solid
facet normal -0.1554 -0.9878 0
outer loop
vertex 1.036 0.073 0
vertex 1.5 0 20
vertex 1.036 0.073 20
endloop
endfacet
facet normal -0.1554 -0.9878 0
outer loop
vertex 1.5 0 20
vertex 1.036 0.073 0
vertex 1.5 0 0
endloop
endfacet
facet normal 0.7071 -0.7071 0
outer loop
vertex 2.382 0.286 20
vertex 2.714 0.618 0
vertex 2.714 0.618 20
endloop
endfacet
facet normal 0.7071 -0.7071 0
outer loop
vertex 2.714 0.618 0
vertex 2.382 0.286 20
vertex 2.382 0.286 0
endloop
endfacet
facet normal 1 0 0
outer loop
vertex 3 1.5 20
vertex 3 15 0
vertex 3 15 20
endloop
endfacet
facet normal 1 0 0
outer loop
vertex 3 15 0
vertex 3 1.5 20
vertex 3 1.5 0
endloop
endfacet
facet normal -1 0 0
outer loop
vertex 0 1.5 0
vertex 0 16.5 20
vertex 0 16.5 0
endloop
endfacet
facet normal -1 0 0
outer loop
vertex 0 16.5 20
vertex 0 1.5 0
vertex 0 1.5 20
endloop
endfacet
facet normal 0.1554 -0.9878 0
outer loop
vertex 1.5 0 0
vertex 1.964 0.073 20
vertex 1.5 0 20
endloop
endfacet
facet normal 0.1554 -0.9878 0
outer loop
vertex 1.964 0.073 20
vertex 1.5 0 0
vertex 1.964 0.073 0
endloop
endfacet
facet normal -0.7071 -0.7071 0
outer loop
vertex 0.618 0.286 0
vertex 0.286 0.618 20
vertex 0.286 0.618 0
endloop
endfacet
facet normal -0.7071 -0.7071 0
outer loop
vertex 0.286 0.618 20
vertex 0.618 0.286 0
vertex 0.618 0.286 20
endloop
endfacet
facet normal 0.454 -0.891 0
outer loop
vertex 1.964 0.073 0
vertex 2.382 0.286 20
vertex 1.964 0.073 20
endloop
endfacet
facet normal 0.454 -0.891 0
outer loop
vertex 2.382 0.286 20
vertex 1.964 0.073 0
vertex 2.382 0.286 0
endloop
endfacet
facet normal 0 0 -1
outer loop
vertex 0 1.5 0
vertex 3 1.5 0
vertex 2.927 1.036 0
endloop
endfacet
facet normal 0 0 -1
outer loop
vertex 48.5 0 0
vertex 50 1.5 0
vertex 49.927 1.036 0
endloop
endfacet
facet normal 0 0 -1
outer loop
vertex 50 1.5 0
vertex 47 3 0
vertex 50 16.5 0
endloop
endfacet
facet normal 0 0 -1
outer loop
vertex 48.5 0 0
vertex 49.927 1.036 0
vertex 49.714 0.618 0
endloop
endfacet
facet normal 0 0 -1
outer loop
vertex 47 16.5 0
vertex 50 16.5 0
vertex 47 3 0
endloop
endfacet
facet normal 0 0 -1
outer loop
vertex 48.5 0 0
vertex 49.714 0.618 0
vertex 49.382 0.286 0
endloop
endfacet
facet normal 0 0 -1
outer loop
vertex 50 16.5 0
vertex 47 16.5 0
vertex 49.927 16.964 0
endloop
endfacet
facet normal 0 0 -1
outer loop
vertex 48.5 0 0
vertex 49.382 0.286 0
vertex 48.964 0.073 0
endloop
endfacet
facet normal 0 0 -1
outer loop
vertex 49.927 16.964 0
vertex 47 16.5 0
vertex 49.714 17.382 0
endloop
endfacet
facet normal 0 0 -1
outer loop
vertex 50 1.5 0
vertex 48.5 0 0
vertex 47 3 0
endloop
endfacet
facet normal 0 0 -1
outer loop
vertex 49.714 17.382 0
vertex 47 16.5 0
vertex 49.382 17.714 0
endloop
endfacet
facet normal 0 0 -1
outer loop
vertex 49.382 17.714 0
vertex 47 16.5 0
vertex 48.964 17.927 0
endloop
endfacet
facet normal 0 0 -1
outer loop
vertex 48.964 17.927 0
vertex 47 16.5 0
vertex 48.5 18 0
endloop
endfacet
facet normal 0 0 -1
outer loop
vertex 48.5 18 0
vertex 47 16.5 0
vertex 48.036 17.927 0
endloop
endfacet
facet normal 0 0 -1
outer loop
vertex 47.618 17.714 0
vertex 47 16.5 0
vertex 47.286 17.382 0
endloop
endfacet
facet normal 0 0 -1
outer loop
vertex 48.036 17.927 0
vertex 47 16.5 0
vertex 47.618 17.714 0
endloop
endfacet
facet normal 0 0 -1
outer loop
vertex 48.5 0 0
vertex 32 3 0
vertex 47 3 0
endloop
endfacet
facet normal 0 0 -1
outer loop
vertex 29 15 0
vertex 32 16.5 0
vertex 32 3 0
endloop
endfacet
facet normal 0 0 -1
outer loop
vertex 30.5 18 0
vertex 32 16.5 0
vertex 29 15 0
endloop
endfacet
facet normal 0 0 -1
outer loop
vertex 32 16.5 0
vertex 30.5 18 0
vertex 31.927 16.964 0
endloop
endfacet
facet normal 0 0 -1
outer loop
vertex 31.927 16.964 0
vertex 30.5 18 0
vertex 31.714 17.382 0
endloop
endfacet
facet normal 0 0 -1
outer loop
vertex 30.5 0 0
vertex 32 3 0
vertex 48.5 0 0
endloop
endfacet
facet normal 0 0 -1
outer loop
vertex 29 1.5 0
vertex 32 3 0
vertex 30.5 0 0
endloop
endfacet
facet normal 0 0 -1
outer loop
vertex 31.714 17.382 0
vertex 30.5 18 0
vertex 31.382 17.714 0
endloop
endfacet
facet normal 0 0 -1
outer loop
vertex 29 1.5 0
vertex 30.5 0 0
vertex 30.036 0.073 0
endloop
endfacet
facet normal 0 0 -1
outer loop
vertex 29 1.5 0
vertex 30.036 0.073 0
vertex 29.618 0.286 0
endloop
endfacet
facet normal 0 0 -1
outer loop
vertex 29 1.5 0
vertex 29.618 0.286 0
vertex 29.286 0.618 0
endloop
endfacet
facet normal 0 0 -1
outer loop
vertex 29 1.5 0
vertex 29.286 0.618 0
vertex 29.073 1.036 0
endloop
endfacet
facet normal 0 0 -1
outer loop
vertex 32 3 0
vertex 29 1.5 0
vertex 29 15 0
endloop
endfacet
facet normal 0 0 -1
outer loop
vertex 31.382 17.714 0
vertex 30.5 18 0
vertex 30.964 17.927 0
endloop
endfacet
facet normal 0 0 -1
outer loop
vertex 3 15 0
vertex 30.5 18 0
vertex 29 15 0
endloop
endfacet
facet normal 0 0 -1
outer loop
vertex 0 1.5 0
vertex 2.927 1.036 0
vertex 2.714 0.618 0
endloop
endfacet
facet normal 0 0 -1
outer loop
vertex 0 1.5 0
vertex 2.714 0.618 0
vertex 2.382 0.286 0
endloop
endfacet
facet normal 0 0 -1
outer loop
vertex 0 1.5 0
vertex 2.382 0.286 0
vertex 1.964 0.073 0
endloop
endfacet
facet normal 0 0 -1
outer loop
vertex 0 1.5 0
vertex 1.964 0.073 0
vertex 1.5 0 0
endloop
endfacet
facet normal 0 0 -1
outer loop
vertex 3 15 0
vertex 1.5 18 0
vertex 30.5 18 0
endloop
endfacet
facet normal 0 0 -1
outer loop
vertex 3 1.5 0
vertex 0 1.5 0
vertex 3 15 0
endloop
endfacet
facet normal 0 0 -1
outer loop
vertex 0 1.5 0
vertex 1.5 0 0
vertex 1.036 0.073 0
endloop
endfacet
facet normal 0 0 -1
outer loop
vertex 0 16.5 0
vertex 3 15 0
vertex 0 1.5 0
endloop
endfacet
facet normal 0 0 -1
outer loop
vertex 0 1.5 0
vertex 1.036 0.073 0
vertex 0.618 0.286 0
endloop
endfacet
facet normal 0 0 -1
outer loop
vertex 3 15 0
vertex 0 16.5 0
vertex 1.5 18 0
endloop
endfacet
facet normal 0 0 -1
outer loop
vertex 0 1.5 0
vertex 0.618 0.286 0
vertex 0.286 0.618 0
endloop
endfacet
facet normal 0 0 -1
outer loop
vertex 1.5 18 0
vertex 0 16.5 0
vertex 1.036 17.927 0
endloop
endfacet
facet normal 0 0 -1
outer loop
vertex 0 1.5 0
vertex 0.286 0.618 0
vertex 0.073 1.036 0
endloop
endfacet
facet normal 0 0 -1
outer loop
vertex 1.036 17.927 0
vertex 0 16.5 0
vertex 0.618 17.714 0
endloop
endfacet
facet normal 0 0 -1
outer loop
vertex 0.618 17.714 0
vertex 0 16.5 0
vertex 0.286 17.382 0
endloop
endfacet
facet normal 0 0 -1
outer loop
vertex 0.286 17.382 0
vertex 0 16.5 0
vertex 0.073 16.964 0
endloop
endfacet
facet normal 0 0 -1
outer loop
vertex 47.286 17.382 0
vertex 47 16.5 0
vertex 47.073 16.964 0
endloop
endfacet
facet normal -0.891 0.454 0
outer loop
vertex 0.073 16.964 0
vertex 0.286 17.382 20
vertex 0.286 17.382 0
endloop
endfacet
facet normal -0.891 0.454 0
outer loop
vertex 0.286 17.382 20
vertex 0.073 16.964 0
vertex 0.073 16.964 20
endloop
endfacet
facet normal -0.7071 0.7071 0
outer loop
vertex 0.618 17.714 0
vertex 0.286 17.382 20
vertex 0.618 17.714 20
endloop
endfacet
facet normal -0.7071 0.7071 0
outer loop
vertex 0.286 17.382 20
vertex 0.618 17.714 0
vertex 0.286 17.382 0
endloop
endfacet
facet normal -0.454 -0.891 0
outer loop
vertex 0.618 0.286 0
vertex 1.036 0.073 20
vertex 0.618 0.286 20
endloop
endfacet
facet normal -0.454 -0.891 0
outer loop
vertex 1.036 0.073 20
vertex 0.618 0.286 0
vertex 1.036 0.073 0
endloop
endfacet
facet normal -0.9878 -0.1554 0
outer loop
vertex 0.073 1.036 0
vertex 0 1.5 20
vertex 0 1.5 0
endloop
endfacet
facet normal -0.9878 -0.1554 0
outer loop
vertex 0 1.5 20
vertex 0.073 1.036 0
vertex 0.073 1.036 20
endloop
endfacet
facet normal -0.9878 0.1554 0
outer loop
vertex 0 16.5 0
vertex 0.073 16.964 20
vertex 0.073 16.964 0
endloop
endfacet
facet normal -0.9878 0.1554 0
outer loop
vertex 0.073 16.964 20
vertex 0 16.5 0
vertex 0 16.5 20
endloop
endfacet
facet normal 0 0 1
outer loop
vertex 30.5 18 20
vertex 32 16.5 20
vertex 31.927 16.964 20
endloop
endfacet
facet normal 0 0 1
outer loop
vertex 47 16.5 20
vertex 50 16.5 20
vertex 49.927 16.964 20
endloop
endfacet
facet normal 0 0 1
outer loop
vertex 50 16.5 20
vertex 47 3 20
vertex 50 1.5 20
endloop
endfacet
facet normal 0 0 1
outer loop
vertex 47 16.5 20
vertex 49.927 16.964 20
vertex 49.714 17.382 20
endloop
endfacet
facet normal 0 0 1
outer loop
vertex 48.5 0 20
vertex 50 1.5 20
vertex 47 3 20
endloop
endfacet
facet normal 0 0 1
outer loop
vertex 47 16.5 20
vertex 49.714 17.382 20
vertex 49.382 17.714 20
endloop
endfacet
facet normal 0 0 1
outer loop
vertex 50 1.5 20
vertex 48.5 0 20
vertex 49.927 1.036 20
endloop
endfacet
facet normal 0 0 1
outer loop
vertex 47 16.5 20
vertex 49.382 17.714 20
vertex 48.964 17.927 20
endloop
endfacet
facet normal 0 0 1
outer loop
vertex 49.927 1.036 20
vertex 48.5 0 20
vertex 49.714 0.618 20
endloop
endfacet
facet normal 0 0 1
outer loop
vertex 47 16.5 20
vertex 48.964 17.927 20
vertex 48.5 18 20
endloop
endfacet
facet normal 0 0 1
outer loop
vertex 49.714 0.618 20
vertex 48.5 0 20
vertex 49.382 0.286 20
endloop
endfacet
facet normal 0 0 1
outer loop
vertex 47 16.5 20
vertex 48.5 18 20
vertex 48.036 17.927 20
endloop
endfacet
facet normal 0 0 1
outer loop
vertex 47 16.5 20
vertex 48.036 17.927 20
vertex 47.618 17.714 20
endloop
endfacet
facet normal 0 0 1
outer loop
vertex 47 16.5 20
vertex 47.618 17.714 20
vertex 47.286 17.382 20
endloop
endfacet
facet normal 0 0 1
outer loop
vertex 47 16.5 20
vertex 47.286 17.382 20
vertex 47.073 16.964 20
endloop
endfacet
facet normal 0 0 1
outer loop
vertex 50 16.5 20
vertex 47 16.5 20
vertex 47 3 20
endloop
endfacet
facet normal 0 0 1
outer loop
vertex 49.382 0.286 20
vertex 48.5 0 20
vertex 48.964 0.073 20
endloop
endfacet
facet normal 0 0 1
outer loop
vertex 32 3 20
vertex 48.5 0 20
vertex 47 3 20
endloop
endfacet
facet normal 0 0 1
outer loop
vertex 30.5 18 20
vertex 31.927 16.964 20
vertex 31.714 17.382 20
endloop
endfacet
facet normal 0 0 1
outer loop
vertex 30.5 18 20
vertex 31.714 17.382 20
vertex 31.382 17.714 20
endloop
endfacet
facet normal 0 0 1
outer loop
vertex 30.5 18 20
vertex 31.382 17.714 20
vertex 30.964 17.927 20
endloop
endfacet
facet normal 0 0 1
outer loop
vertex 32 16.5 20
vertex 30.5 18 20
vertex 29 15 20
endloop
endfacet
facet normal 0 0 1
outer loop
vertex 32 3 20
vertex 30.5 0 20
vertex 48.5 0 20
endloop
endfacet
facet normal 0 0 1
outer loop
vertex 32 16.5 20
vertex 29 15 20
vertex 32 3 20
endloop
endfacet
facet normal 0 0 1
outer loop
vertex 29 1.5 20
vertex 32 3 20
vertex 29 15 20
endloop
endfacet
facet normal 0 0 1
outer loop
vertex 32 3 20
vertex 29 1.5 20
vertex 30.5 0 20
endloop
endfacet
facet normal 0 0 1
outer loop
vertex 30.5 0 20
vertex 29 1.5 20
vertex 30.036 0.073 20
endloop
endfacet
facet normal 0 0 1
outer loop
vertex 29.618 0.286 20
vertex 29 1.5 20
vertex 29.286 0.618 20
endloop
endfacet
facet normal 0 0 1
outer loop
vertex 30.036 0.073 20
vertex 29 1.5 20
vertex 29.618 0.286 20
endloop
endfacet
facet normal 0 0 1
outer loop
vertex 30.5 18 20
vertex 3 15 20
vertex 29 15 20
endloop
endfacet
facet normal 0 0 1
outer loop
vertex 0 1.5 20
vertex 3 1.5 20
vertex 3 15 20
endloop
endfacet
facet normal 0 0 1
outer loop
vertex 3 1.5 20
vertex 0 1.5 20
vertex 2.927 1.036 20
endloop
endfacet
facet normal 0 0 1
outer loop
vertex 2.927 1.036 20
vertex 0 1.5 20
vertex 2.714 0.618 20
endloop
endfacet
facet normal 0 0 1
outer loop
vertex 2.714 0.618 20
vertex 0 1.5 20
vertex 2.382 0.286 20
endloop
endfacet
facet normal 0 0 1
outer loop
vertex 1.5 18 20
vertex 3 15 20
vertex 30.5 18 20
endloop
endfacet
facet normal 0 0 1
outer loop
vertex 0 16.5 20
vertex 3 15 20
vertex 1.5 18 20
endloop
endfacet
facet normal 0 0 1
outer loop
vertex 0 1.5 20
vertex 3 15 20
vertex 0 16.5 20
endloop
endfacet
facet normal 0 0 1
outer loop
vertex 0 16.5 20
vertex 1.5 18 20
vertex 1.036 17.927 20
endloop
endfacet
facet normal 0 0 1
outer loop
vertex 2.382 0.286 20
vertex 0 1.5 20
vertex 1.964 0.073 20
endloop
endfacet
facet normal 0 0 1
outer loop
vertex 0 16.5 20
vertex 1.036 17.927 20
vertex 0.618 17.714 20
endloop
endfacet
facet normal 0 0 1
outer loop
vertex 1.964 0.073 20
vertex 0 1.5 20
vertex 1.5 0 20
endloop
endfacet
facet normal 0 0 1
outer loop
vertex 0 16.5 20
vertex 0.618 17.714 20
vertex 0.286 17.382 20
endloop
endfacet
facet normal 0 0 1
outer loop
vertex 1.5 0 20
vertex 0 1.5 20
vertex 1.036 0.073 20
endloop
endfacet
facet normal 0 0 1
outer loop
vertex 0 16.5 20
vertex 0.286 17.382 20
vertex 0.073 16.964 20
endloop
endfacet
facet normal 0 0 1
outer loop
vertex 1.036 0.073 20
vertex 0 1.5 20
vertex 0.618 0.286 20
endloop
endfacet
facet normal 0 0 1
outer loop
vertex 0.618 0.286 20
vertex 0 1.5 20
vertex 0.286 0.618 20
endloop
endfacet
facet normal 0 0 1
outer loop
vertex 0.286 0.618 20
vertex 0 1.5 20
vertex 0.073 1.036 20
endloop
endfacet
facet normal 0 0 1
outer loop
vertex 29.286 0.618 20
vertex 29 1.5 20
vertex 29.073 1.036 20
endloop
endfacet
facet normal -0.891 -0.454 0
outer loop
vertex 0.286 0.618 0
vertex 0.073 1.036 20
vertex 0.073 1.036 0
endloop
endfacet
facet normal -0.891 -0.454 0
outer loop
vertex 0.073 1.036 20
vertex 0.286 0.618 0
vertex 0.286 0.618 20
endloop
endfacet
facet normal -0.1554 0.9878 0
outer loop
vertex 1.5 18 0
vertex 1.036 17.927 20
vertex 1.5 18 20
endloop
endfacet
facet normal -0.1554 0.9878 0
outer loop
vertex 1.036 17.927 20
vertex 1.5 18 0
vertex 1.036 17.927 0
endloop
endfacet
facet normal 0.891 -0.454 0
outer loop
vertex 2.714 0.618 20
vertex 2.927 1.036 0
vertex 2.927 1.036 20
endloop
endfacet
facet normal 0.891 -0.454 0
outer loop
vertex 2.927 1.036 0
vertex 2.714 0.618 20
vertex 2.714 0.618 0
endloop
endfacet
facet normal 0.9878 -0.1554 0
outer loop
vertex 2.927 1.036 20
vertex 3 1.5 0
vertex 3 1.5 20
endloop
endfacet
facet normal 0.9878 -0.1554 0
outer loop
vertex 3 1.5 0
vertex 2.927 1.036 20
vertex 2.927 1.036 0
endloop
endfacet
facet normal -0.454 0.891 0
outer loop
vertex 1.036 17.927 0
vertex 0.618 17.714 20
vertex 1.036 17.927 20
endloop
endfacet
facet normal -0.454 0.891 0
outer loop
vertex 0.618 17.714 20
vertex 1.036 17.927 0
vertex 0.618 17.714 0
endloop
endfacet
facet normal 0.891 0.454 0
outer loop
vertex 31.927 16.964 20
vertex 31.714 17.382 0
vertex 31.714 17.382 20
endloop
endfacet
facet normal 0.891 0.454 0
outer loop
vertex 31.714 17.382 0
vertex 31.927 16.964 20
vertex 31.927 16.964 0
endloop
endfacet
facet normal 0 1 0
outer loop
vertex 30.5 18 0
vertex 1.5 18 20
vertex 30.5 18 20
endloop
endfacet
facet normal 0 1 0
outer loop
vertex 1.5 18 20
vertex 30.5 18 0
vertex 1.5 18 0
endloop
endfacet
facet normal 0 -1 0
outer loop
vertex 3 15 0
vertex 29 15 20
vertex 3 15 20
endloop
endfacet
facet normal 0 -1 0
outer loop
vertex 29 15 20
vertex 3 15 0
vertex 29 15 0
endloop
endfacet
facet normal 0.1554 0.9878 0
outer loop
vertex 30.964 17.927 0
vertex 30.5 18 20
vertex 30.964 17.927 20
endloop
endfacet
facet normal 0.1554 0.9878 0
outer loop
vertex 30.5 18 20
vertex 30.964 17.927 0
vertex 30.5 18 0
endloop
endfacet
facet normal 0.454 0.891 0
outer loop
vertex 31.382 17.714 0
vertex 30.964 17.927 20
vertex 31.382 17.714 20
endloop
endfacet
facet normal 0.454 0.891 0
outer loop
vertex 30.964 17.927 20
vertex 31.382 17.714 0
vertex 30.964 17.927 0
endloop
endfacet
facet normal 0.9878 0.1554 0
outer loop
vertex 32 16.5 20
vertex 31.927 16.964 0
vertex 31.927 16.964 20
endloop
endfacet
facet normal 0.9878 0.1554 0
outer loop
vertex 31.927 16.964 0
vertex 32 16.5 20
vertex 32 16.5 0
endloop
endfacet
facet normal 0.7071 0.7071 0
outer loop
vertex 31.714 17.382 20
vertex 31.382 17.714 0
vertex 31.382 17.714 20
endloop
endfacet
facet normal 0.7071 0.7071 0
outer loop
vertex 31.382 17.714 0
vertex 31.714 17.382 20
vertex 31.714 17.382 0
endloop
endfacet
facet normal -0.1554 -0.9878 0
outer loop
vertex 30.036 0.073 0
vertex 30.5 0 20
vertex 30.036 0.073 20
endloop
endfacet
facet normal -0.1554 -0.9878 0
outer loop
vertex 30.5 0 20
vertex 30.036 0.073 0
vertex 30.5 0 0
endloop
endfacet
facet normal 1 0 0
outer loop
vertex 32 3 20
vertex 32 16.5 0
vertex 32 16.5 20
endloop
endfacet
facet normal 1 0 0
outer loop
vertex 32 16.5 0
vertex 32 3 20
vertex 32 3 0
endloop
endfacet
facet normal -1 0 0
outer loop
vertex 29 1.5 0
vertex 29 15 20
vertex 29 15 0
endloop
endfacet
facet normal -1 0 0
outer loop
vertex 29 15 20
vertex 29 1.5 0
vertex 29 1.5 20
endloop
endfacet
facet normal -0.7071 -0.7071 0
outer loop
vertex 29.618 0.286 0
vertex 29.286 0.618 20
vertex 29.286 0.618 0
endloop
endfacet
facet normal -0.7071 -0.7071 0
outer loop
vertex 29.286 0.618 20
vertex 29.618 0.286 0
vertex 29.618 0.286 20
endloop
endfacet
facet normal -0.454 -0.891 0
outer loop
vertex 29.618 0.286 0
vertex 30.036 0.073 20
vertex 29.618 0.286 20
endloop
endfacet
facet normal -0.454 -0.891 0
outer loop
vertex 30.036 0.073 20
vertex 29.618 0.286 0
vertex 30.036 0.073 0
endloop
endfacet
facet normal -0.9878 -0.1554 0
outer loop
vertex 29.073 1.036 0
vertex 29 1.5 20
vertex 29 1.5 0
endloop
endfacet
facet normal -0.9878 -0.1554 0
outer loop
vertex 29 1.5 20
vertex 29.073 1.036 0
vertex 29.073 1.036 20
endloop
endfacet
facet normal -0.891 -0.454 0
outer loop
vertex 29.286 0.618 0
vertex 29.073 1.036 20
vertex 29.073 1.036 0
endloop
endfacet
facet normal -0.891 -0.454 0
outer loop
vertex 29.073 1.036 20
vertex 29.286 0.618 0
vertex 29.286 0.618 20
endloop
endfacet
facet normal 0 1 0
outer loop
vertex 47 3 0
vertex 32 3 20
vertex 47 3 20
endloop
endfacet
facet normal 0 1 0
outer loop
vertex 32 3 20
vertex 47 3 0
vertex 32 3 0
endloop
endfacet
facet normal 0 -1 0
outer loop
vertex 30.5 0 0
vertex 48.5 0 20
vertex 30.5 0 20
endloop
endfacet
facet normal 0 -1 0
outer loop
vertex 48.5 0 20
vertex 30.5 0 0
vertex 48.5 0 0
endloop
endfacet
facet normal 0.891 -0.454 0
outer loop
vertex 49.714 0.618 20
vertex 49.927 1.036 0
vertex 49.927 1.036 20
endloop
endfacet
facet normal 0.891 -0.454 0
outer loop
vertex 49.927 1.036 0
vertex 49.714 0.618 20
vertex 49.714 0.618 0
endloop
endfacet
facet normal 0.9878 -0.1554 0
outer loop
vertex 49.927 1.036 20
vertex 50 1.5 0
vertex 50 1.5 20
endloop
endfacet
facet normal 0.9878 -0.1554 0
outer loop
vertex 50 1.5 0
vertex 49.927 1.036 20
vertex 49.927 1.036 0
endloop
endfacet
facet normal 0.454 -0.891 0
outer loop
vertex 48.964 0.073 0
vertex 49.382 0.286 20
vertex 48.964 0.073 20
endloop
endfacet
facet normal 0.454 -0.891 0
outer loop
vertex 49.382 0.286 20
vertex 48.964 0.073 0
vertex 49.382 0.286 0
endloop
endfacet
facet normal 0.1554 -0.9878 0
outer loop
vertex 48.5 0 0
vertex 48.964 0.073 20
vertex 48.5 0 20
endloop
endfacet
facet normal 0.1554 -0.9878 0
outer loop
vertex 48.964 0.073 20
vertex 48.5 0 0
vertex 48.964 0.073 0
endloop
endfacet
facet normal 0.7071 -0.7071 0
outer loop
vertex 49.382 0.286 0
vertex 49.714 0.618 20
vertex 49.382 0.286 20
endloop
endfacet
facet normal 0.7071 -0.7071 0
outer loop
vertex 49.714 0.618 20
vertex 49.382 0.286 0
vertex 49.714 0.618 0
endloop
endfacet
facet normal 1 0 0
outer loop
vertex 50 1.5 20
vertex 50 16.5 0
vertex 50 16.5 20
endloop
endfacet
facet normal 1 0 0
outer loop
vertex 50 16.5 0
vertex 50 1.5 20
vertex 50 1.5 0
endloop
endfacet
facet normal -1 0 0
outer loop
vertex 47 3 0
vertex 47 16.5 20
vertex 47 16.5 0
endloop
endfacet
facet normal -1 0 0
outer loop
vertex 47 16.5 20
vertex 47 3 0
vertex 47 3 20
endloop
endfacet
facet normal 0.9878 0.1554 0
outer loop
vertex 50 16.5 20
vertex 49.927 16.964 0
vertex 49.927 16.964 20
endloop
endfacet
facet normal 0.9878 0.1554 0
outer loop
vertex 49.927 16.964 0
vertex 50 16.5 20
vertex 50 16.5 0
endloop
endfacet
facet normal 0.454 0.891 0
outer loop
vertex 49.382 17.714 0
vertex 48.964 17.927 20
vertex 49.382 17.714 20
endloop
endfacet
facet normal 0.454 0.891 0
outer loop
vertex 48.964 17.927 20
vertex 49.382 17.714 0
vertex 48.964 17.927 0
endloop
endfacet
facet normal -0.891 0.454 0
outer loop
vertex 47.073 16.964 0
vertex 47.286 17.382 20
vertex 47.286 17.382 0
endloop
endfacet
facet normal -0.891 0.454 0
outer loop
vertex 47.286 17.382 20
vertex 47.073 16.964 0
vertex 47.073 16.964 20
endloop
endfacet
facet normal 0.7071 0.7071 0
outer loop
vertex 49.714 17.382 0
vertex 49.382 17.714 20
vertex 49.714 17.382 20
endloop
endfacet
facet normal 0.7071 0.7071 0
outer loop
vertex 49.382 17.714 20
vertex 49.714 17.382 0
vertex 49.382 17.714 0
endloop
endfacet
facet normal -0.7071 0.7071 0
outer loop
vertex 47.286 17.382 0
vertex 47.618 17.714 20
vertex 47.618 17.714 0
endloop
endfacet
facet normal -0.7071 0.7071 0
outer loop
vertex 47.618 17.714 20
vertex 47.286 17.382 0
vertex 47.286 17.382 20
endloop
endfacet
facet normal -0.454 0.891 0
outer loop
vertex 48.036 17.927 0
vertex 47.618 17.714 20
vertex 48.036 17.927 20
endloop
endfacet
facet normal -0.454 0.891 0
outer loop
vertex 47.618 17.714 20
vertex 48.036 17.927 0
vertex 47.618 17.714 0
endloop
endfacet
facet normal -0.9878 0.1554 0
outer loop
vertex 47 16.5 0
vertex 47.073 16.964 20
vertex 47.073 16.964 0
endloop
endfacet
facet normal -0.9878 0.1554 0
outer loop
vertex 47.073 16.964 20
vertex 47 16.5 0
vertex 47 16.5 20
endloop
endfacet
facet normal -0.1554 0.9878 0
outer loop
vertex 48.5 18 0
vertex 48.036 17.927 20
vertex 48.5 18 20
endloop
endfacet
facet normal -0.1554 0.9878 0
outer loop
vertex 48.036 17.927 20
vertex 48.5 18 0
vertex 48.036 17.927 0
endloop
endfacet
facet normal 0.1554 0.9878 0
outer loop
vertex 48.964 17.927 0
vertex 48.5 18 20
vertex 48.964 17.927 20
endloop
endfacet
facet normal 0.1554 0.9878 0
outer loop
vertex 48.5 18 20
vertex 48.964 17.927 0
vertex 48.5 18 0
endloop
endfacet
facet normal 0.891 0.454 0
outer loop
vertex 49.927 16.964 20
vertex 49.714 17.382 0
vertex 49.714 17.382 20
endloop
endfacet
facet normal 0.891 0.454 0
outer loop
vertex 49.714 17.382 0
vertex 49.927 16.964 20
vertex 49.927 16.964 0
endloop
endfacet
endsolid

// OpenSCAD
wall = 3;       // [2:0.5:5]
depth = 15;     // [5:1.0:30]
monitor = 26;   // [5:0.5:50]
hook = 15;      // [5:1.0:100]
width = 20;     // [5:1.0:50]
hook_type="simple"; // [simple,side]
print_orientaion="no"; // [yes,no]

choose();

module choose()
{
    if(hook_type=="simple")
    {
        simple();
    }
    else
    {
        if(print_orientaion=="yes")
        {
            translate([0,0,width+depth+hook]) rotate([0,90,0]) side_hook();
        }
        else
        {
            side_hook();
        }
    }
}

module simple()
{
    r_corner = wall/2;
    $fn=20;
    
    rounded_cube([wall,depth+wall,width], rCorner=r_corner, dimensions=2);
    translate([0,depth,0]) rounded_cube([monitor+2*wall,wall,width], rCorner=r_corner, dimensions=2);
    translate([monitor+wall,0,0]) rounded_cube([wall,depth+wall,width], rCorner=r_corner, dimensions=2);
    translate([monitor+wall,0,0]) rounded_cube([hook+2*wall,wall,width], rCorner=r_corner, dimensions=2);
    translate([monitor+2*wall+hook,0,0]) rounded_cube([wall,depth+wall,width], rCorner=r_corner, dimensions=2);
}

module side_hook()
{
    r_corner = wall/2;
    $fn=20;
    
    difference()
    {
        rounded_cube([width+depth+hook,monitor+2*wall,depth], rCorner=r_corner, dimensions=3);
        translate([0,wall,-wall]) cube([width+depth+hook,monitor,depth]);
        hook_cut();
    }
    hook();
}

module hook()
{
    r_corner = wall/2;
    $fn=20;

    difference()
    {
        intersection()
        {
            rounded_cube([width+depth+hook,monitor+2*wall,depth], rCorner=r_corner, dimensions=3);
            hook_cut();
        }
        translate([0,0,wall]) hook_cut();
    }
}

module hook_cut()
{
    s=depth/2+wall;
    translate([depth/2+hook,2*monitor,depth]) tri_angle(s, -s, 3*monitor, direction=2);
    translate([depth/2,2*monitor,depth]) tri_angle(-s, -s, 3*monitor, direction=2);
    translate([depth/2-0.001,-monitor,depth/2-wall]) cube([hook+0.002,3*monitor,s]);
}

/*
 * rectangular tri angle, with height
 * directions 1-3: the rect angle is located at coordinates 0,0,0
 * direction 0: default, legacy, the rect angle is at x,0
 * negative values changes direction
 * direction 1: xy
 * direction 2: xz
 * direction 3: yz
 */
module tri_angle(a, b, wall, direction=0)
{
    myPoints=[
    [[0,0],[a,0],[a,b]],
    [[0,0],[a,0],[0,b]],
    [[0,0],[a,0],[0,b]],
    [[0,0],[a,0],[0,b]]
    ];
    myRotate=[
    [0,0,0],
    [0,0,0],
    [90,0,0],
    [90,0,90]
    ];
    
    rotate(myRotate[direction])
        linear_extrude(height = wall) 
            polygon( points=myPoints[direction]);
}

/*
 * cube with rounded edges and corners, depends on param dimensions
 * outerCube is [X,Y,Z]
 * rCorner is the radius of the edges rounding
 * dimensions 2:   4 edges rounded
 * dimensions 3: all edges rounded corners as well
 */
module rounded_cube(outerCube, rCorner, dimensions=3)
{
    hull()
    {
        for(xPos = [rCorner,outerCube[0]-rCorner])
        {
            for(yPos = [rCorner,outerCube[1]-rCorner])
            {
                if(dimensions==2)
                {
                    translate([xPos,yPos,0]) cylinder(r=rCorner, h=outerCube[2]);
                }
                if(dimensions==3)
                {
                    for(zPos = [rCorner,outerCube[2]-rCorner])
                    {
                        translate([xPos,yPos,zPos]) sphere(r=rCorner);
                    }
                }
            }
        }
    }
}
